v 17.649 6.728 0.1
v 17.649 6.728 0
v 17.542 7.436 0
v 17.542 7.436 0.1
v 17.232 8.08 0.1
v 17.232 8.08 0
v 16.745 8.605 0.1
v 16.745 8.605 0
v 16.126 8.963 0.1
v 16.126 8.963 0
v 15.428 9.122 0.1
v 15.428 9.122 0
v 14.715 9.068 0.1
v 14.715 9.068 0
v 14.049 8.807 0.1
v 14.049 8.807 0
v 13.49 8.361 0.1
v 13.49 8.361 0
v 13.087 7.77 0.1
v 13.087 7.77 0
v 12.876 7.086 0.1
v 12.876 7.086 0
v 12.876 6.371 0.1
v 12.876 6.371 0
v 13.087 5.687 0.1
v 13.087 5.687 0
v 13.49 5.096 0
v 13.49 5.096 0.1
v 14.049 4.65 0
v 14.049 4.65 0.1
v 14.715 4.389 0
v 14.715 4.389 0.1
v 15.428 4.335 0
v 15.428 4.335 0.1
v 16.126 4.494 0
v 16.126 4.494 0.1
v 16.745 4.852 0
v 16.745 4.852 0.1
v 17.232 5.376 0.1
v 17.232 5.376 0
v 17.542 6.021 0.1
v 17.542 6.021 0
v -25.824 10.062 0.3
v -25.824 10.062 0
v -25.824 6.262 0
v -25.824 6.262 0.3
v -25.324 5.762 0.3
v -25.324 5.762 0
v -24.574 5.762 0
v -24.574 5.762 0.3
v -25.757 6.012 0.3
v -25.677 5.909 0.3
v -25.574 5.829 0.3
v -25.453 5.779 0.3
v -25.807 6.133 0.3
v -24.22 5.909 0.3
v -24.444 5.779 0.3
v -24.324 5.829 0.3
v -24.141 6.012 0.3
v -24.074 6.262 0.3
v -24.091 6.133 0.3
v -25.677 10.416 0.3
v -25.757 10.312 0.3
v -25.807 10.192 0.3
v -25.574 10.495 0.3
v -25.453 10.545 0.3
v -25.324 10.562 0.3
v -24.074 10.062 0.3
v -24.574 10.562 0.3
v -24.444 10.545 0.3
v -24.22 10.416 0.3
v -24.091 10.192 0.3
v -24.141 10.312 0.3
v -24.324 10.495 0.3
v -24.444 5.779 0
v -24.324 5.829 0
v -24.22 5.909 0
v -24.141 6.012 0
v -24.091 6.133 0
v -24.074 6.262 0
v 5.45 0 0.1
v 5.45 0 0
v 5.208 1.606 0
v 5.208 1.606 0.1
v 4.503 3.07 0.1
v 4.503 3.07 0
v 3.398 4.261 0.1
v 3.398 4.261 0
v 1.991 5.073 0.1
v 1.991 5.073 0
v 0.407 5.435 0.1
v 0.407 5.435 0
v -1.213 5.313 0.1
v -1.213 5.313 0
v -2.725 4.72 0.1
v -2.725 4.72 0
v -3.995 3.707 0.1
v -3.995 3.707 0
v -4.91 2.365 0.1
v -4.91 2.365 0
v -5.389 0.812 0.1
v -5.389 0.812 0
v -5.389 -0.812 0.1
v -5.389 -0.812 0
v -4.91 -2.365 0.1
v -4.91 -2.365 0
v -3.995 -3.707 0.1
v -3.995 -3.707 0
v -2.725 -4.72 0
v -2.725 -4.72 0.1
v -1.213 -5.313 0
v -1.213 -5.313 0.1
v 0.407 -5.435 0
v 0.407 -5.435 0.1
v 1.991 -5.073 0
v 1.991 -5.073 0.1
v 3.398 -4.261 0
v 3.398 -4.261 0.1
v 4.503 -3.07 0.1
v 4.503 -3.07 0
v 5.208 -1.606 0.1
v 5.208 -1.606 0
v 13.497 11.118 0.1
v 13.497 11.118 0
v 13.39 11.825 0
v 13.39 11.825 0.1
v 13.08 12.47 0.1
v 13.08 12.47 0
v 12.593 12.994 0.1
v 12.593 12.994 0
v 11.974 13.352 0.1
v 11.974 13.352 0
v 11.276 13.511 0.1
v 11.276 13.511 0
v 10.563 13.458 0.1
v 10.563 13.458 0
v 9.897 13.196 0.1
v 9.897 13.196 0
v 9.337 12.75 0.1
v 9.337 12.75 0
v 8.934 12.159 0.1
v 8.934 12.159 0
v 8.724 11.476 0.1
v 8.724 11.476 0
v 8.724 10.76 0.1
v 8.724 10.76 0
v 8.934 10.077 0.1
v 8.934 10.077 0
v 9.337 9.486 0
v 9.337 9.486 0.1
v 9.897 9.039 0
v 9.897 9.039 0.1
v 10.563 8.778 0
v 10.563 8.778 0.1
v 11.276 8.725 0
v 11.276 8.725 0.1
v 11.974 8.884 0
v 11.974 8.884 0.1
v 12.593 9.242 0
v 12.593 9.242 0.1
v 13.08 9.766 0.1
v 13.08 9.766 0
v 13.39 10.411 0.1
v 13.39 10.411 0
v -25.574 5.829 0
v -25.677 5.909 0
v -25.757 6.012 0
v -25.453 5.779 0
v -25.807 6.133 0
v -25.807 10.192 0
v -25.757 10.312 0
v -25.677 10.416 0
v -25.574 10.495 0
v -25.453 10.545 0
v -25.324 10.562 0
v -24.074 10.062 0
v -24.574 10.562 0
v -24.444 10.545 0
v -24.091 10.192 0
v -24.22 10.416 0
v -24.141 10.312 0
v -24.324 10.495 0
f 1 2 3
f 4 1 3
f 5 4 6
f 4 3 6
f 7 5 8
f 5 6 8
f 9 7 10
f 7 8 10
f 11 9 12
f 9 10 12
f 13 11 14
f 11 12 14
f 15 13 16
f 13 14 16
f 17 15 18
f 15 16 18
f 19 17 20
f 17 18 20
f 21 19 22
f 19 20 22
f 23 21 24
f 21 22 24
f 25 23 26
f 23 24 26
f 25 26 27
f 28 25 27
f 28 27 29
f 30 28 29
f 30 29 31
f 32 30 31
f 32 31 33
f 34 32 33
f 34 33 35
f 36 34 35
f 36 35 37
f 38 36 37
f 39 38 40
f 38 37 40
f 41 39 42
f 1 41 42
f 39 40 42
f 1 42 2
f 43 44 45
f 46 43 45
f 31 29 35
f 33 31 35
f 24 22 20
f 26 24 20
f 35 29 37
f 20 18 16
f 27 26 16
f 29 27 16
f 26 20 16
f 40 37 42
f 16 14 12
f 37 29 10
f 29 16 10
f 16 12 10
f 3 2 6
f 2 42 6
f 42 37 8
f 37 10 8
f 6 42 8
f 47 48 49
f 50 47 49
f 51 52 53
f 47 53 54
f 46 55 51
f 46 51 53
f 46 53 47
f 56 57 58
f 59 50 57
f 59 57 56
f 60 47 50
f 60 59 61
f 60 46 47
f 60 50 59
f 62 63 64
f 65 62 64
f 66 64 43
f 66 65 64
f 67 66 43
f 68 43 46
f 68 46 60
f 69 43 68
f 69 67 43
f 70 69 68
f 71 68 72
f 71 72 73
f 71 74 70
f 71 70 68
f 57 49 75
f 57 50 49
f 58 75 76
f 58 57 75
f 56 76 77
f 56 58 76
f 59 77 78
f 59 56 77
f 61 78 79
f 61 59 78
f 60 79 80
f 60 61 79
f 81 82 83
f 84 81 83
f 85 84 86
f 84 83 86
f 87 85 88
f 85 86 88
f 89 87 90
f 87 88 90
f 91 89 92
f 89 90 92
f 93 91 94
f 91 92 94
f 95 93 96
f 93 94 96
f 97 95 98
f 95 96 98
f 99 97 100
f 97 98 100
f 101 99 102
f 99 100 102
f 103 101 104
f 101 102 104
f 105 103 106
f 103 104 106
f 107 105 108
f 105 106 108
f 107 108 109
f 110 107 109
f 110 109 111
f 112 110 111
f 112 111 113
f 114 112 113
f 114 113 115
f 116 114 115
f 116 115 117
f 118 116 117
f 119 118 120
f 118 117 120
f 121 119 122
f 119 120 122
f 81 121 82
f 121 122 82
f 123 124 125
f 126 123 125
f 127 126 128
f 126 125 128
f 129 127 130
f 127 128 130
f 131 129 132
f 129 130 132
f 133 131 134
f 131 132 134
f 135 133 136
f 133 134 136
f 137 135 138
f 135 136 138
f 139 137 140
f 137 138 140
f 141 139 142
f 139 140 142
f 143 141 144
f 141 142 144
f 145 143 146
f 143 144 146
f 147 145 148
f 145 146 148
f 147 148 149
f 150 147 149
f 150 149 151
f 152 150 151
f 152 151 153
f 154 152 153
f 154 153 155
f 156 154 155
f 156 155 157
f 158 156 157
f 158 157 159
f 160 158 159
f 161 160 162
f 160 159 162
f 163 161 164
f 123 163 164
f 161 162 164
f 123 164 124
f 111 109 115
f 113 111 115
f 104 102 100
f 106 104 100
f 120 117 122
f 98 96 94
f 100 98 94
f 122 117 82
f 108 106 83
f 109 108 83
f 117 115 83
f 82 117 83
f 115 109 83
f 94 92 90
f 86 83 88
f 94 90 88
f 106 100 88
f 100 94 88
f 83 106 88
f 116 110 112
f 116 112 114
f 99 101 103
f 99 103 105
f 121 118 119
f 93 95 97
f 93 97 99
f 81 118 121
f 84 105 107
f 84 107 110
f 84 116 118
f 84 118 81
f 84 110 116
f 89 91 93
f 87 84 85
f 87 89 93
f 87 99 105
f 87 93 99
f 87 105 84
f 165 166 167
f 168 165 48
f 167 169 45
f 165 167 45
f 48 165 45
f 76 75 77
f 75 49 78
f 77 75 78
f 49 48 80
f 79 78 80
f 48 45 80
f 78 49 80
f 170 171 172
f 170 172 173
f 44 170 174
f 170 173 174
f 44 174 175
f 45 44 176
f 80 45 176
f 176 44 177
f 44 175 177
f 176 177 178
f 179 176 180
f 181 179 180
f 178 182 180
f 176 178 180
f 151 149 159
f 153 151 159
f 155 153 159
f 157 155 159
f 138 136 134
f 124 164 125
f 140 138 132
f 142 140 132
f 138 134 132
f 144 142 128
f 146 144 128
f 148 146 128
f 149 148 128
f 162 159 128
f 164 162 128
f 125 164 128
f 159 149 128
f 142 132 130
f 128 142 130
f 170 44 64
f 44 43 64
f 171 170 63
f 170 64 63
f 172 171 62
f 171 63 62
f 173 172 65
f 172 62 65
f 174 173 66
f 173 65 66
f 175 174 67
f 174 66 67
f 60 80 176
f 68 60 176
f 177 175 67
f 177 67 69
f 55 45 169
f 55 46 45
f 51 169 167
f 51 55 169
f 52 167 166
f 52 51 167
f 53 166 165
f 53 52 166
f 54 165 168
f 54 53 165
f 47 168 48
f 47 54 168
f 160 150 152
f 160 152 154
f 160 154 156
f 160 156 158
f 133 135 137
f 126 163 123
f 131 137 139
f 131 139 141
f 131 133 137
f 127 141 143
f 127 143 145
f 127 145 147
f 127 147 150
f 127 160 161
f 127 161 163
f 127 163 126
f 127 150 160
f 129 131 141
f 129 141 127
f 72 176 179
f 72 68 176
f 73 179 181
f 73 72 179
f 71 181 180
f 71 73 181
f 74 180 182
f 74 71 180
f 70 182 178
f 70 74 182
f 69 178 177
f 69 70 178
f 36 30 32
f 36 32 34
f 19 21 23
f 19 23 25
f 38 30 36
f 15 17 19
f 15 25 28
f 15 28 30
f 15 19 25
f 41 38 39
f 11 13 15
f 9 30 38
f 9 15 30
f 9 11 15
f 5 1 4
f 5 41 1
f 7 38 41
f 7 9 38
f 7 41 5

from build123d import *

# Parameters (mm, degrees)
F0_R     = 5.45
F1_DEPTH = 0.1
F2_R     = 2.4
F3_DEPTH = 0.1
F4_W     = 1.75
F4_H     = 1.4
F4_H_2   = 2
F5_DEPTH = 0.3
F6_R     = 0.5


with BuildPart() as f1:
    # F0 (on Top) → F1 (new body)
    with BuildSketch(Plane.XY):
        Circle(F0_R)
    extrude(amount=F1_DEPTH)


with BuildPart() as f3:
    # F2 (on Top) → F3 (new body)
    with BuildSketch(Plane.XY):
        with Locations((11.096717, 11.117948)):
            Circle(F2_R)
        with Locations((15.24898, 6.728412)):
            Circle(F2_R)
    extrude(amount=F3_DEPTH)


with BuildPart() as f5:
    # F4 (on Top) → F5 (new body)
    with BuildSketch(Plane.XY):
        with Locations((-24.948817, 9.862341)):
            Rectangle(F4_W, F4_H)
        with Locations((-24.948817, 8.162341)):
            Rectangle(F4_W, F4_H_2)
        with Locations((-24.948817, 6.462341)):
            Rectangle(F4_W, F4_H)
    extrude(amount=F5_DEPTH)

    # F6
    f6_edges = [f5.edges().sort_by_distance(p)[0] for p in [
        (-24.073817, 10.562341, 0.15),
        (-25.823817, 10.562341, 0.15),
        (-25.823817, 5.762341, 0.15),
        (-24.073817, 5.762341, 0.15),
    ]]
    fillet(f6_edges, radius=F6_R)


solid = Compound([f1.part, f3.part, f5.part])
